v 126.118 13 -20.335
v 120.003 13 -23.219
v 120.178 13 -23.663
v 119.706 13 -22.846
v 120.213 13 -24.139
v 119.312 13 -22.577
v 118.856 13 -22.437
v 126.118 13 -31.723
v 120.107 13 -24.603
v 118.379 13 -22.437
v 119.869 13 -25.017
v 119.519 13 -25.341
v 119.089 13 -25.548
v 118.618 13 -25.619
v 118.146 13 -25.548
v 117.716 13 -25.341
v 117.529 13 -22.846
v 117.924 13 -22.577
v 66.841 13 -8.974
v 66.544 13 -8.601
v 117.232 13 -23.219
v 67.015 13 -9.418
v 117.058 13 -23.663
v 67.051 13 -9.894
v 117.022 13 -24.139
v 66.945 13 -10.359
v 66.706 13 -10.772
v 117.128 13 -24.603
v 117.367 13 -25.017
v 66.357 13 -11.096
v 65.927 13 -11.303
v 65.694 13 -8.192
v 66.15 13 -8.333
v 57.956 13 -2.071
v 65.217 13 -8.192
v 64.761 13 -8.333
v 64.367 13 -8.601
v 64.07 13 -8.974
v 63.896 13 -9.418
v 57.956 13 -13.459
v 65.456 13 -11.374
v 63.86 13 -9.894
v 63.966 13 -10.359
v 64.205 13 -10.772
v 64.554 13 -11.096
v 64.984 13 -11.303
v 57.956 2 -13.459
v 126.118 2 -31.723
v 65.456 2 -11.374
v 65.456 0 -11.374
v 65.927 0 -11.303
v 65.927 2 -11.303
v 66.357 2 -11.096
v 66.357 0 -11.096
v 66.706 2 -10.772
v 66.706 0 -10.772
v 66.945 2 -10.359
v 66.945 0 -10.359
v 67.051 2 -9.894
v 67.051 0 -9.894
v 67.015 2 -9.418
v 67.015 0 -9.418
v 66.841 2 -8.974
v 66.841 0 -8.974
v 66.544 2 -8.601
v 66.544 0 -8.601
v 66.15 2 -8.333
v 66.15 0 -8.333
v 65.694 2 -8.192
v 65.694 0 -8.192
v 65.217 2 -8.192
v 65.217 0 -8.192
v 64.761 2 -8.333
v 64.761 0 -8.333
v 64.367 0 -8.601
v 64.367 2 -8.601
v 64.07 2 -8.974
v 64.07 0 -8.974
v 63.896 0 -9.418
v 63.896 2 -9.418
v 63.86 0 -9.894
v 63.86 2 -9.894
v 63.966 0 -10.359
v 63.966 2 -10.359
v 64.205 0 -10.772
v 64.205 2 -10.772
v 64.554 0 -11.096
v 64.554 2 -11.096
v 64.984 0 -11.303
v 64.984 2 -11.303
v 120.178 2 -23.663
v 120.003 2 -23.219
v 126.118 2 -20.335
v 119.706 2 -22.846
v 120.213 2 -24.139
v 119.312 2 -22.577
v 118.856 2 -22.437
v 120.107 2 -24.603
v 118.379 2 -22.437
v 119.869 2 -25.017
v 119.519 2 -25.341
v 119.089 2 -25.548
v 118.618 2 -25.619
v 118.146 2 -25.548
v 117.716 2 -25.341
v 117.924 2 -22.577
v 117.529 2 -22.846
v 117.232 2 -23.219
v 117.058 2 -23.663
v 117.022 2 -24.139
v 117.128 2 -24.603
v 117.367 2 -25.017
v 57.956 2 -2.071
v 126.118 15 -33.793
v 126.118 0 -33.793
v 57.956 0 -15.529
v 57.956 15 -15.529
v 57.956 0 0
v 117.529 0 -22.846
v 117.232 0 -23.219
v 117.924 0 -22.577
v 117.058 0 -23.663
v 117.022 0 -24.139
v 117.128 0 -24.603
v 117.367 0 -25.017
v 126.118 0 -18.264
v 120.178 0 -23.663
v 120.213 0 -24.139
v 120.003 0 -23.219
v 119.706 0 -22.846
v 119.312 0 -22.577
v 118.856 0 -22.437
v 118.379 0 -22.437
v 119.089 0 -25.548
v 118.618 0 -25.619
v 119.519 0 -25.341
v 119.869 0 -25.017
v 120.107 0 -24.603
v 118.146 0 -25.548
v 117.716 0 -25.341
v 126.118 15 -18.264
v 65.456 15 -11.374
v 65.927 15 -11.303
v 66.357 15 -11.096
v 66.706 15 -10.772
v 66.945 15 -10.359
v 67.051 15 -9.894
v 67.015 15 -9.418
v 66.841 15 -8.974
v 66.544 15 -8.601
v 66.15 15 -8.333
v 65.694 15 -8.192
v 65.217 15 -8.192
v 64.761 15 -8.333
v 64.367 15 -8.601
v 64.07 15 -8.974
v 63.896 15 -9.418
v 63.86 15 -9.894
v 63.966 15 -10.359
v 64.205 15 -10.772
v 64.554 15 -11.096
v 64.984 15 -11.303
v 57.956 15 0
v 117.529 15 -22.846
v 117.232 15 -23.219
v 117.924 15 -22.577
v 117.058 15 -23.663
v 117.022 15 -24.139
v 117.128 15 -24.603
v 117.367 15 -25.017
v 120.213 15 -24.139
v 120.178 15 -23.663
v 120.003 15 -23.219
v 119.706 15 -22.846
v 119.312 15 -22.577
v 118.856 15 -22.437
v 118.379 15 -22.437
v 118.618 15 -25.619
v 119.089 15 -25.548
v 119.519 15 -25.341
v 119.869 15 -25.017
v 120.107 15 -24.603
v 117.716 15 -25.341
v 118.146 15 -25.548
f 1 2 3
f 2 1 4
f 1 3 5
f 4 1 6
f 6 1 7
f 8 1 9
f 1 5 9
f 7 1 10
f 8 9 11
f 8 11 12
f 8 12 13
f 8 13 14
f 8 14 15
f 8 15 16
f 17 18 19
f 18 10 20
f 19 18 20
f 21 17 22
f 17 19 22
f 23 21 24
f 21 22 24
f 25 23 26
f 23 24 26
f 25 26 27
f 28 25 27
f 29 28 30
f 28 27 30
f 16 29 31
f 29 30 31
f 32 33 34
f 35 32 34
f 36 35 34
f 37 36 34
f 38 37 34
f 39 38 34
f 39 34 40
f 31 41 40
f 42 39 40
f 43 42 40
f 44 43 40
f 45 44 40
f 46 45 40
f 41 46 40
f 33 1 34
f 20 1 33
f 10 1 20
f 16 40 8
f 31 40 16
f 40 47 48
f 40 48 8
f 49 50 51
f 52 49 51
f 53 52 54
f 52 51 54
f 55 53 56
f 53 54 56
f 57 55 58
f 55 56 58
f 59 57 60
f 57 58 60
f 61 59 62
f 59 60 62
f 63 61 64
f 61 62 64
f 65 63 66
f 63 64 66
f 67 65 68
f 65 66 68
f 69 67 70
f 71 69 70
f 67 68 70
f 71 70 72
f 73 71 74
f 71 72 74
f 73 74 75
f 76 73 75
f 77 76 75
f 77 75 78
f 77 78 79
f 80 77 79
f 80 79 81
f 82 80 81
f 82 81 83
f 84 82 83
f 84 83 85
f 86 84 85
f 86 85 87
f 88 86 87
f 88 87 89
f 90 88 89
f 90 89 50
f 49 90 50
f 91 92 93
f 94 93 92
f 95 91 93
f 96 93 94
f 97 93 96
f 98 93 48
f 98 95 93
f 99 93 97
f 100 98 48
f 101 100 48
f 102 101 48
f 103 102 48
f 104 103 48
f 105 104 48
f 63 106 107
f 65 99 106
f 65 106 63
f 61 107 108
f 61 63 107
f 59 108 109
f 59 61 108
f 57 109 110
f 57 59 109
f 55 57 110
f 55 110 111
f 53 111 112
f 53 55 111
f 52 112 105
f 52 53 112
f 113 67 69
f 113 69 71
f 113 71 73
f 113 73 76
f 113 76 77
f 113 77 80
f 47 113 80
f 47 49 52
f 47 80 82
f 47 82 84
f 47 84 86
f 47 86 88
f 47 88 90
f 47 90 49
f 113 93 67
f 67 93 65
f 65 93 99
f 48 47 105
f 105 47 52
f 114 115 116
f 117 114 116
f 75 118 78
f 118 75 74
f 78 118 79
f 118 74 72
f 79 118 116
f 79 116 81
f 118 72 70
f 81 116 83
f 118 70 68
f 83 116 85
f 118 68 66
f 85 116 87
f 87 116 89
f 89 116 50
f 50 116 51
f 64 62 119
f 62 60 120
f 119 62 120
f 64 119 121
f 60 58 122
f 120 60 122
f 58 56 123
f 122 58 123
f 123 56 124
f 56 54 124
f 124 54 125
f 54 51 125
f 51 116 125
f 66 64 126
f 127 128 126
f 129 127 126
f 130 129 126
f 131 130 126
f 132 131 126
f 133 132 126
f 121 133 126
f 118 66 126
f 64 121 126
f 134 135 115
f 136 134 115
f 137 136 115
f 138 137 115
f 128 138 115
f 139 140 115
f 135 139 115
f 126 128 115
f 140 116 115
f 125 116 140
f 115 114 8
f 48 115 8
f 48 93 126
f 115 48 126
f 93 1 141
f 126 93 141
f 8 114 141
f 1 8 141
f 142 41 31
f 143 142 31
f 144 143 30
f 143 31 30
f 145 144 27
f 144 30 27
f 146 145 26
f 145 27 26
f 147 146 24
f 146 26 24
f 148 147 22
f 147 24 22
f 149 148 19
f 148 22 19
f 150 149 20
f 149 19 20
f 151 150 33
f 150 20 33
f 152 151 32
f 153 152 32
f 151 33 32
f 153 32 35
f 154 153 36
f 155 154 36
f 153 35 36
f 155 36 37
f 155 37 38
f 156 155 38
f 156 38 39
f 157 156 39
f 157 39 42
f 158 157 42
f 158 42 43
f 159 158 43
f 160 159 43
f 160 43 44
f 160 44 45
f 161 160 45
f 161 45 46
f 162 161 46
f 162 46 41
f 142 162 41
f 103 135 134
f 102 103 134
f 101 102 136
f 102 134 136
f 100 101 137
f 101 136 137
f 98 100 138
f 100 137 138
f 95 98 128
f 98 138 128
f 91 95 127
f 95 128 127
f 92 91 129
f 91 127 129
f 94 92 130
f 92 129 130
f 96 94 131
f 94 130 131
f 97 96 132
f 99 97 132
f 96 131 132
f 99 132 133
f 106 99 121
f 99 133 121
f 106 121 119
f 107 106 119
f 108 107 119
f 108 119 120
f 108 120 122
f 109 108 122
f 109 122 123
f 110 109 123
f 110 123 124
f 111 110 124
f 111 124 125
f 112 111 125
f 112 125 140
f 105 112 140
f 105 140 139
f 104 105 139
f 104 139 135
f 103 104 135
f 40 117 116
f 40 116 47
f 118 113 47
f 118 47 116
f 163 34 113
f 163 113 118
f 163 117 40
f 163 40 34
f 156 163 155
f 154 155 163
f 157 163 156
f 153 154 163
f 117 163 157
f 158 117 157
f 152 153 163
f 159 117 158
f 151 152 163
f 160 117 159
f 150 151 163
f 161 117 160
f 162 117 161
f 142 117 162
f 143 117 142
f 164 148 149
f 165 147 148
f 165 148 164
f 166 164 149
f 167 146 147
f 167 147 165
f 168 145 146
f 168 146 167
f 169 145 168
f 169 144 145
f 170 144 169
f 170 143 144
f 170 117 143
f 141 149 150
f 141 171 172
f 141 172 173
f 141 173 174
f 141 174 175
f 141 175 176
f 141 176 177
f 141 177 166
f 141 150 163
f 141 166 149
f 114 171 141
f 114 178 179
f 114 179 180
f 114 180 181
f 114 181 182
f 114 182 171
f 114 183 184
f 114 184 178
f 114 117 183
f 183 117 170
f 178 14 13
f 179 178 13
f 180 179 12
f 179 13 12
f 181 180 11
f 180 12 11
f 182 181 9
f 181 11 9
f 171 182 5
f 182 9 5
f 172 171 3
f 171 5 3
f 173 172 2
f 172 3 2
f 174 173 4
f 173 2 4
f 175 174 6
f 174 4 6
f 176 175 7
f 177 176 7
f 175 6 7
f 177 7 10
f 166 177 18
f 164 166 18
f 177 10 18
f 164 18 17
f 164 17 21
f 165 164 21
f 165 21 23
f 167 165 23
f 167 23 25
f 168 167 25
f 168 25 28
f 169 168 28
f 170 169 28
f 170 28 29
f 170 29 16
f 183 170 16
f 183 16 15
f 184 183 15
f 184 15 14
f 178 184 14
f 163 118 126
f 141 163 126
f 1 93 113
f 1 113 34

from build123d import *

# Parameters (mm, degrees)
BOSS_EXTRUDE1_DEPTH = 15
SKETCH2_W           = 11
SKETCH2_H           = 11
CUT_EXTRUDE1_DEPTH  = 80.765427423
CUT_EXTRUDE2_DEPTH  = 136.155378328
SKETCH4_R           = 1.6
CUT_EXTRUDE3_DEPTH  = 132.425469972


with BuildPart() as part:
    # Sketch1 → Boss-Extrude1 (new body)
    with BuildSketch(Plane(origin=(0, 0, 0), x_dir=(1, 0, 0), z_dir=(0, 1, 0))):
        Polygon((130, 19.30425231), (126.117714323, 33.793139704), (54.073263901, 14.488887394), (57.955549577, 0), align=None)
    extrude(amount=BOSS_EXTRUDE1_DEPTH)

    # Sketch2 → Cut-Extrude1 (cut, through all)
    with BuildSketch(Plane(origin=(54.073263901, 0, -14.488887394), x_dir=(-0.2588190451025183, 0, -0.965925826289069), z_dir=(0.965925826289069, 0, -0.2588190451025183))):
        with Locations((-7.5, 7.5)):
            Rectangle(SKETCH2_W, SKETCH2_H)
    extrude(amount=CUT_EXTRUDE1_DEPTH, mode=Mode.SUBTRACT)

    # Sketch3 → Cut-Extrude2 (cut, through all)
    with BuildSketch(Plane(origin=(0, 15, 0), x_dir=(1, 0, 0), z_dir=(0, 1, 0))):
        Polygon((126.117714323, 33.793139704), (126.117714323, 18.263996998), (130, 19.30425231), align=None)
        Polygon((54.073263901, 14.488887394), (57.955549577, 15.529142706), (57.955549577, 0), align=None)
    extrude(amount=-CUT_EXTRUDE2_DEPTH, mode=Mode.SUBTRACT)

    # Sketch4 → Cut-Extrude3 (cut, through all)
    with BuildSketch(Plane.XZ):
        with Locations(Location((118.617714323, -24.018949408, 0), (0, 0, 270))):
            Circle(SKETCH4_R)
        with Locations(Location((65.455549577, -9.774190296, 0), (0, 0, 270))):
            Circle(SKETCH4_R)
    extrude(amount=-CUT_EXTRUDE3_DEPTH, mode=Mode.SUBTRACT)


solid = part.part
